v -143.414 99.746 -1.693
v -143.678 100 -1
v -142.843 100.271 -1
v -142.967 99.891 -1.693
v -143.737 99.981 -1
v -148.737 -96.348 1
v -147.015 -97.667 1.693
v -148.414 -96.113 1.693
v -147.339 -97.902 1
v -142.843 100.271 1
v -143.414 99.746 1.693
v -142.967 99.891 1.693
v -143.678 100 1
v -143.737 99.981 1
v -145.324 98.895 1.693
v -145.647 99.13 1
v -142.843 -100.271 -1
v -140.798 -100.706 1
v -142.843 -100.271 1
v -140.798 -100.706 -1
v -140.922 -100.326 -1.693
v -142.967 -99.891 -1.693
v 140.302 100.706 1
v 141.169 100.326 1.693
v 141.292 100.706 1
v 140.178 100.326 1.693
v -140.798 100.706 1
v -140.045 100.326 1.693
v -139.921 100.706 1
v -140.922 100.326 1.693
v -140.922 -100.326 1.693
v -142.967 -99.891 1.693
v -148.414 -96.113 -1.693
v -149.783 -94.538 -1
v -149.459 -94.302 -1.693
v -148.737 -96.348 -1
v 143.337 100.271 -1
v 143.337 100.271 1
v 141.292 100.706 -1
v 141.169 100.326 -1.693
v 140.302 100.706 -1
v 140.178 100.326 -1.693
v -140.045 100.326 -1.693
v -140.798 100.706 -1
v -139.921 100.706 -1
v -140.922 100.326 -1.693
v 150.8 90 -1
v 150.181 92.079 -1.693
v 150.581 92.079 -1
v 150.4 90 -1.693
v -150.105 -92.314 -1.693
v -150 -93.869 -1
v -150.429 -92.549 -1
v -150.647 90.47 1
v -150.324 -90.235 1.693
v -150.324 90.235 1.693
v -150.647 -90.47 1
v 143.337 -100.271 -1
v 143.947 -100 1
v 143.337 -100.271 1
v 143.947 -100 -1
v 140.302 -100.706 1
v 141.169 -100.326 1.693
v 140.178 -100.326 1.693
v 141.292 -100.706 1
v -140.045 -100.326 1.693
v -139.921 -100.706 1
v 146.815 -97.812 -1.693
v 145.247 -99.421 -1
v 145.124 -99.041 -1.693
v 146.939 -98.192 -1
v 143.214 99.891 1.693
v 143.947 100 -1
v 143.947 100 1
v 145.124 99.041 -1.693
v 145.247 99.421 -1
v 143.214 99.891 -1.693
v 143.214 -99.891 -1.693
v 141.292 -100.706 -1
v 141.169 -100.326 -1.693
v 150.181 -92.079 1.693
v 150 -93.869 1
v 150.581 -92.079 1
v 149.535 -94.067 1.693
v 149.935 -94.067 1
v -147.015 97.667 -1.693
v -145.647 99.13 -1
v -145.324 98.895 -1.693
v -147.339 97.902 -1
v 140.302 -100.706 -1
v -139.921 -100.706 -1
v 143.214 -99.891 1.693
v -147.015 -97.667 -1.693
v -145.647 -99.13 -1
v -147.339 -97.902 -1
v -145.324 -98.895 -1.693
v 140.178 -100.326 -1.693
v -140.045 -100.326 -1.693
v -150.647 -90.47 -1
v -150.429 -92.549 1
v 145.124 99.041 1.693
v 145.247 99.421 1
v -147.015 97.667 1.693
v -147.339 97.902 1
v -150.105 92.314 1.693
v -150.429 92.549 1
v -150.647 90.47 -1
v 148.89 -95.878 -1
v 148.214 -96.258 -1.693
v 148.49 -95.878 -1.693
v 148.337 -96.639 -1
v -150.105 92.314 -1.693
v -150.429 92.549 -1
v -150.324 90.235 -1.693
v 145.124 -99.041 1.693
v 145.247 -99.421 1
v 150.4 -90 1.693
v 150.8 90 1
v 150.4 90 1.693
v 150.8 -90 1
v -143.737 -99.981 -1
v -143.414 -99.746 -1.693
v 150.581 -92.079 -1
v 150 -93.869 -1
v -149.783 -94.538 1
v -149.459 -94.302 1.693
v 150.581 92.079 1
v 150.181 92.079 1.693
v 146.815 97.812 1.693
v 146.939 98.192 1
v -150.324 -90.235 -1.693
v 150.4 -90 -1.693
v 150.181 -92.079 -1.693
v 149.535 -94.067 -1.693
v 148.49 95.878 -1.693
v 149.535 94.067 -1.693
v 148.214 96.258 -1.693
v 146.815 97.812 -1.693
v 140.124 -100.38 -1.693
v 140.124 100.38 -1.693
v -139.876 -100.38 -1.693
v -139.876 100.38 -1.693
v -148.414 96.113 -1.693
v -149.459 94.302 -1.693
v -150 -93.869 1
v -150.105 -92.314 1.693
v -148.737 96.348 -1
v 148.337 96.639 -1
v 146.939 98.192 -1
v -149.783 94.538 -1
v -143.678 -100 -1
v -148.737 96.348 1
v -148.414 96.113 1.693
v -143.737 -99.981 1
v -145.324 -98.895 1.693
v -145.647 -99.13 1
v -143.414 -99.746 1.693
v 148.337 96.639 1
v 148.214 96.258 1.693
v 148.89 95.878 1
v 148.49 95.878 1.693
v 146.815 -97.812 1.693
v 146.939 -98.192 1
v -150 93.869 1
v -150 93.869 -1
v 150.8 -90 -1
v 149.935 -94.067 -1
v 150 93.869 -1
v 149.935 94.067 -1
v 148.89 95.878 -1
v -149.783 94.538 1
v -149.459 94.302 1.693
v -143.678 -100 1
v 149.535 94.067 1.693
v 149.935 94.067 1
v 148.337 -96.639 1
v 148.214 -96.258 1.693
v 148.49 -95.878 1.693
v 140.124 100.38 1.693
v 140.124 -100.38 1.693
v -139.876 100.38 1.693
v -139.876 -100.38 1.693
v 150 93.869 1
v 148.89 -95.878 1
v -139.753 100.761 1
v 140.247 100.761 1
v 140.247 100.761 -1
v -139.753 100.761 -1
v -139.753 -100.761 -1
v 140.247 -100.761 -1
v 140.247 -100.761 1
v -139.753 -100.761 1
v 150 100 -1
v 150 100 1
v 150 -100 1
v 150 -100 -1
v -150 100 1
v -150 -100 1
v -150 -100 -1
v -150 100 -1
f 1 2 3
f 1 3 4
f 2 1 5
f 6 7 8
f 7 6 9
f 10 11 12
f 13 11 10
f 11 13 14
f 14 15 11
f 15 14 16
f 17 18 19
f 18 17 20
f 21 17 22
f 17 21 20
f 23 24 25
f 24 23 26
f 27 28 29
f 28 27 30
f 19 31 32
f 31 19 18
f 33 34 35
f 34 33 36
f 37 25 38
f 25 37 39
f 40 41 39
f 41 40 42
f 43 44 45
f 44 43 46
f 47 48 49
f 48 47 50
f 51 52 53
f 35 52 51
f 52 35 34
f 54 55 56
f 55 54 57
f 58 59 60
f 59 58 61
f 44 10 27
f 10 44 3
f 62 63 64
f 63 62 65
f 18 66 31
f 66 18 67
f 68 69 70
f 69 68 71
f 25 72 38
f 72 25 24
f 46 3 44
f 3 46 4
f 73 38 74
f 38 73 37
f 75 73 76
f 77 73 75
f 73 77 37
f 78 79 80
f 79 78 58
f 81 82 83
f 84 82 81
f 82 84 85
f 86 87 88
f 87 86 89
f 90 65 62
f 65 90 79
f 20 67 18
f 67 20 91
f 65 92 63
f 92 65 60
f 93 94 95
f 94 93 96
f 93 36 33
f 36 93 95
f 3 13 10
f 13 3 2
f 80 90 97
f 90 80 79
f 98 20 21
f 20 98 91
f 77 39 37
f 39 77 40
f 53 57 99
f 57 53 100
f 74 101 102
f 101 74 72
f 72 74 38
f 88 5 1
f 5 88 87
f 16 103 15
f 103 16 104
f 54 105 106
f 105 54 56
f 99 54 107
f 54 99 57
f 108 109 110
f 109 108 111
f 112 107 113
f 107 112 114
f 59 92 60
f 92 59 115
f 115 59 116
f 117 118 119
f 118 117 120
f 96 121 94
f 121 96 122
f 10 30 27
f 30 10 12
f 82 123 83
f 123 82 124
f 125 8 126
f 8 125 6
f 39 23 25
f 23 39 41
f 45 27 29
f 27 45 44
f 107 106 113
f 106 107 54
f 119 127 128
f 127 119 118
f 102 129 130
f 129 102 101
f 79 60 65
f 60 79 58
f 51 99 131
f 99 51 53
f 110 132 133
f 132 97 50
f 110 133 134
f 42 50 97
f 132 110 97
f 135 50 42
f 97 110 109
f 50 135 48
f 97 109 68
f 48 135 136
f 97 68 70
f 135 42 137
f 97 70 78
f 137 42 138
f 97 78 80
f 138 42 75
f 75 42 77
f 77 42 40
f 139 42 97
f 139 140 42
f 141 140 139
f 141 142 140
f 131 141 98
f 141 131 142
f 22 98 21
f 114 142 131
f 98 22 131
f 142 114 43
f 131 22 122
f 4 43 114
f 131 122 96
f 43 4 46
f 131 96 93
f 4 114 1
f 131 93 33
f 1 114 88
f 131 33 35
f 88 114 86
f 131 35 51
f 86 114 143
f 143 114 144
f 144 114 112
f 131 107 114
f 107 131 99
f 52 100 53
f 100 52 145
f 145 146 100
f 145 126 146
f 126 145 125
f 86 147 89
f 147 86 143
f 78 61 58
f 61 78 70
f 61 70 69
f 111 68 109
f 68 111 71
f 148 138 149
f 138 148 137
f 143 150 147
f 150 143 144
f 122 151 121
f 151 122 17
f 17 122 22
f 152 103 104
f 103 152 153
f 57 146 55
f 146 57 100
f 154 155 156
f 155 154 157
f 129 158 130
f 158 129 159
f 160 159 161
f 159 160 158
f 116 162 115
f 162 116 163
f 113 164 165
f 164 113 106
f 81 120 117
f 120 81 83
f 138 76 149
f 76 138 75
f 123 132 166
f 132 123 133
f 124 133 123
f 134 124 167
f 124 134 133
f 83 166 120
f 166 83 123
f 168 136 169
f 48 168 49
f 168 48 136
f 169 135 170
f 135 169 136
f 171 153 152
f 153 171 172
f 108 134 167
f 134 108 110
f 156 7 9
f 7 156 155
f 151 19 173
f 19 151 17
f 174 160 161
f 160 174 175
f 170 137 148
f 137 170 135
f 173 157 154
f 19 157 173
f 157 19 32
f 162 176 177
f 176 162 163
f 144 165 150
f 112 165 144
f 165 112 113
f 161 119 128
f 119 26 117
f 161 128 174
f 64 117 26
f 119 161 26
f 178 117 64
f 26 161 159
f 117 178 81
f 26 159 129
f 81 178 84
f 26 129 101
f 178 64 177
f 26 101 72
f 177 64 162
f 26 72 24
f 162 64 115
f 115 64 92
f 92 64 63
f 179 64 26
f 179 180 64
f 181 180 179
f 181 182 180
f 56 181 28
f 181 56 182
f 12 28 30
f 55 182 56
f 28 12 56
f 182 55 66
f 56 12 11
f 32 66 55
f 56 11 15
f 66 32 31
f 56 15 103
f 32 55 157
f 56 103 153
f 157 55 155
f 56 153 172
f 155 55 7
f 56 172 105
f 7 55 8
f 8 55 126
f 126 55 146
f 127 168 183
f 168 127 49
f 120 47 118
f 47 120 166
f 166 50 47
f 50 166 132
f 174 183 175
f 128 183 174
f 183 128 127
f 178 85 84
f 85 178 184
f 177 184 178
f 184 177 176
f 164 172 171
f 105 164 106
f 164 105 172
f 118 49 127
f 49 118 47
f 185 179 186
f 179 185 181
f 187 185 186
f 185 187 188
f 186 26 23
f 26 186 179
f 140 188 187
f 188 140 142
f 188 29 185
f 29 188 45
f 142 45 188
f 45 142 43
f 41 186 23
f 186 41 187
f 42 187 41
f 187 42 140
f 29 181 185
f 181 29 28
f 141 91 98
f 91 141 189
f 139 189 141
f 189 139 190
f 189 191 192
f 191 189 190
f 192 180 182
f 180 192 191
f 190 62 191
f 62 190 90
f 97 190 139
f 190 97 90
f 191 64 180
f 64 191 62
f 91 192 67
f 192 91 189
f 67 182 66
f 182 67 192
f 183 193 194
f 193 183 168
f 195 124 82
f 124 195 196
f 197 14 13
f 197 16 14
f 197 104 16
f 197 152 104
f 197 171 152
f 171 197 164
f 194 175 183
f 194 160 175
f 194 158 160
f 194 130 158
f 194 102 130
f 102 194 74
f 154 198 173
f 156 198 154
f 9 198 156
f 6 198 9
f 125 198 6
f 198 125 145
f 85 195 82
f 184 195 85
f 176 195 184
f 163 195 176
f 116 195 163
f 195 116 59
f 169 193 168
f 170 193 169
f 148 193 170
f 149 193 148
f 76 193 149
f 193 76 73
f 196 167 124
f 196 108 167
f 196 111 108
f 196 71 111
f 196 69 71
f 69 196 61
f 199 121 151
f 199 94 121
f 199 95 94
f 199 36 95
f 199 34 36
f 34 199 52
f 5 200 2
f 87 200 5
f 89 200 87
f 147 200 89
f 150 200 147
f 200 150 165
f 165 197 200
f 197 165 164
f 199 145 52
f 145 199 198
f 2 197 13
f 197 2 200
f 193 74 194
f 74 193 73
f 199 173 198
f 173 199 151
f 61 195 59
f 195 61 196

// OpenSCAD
// Parameters
sheet_length = 300; //[150:600:1]
sheet_width = 200; //[100:400:1]
sheet_thickness = 2; //[1:6:0.5]
corner_radius = 10; //[2:30:1]
chamfer_size = 0.8; //[0.2:2:0.1]
overlap = 1; //[0.5:2:0.5]

// Base Shapes
module sheet_plate() {
  cube([sheet_length, sheet_width, sheet_thickness], center=true);
}

module rounded_corners() {
  linear_extrude(height=sheet_thickness, center=true) {
    polygon(points=[
      [-sheet_length/2 + corner_radius, -sheet_width/2],
      [sheet_length/2 - corner_radius, -sheet_width/2],
      [sheet_length/2, -sheet_width/2 + corner_radius],
      [sheet_length/2, sheet_width/2 - corner_radius],
      [sheet_length/2 - corner_radius, sheet_width/2],
      [-sheet_length/2 + corner_radius, sheet_width/2],
      [-sheet_length/2, sheet_width/2 - corner_radius],
      [-sheet_length/2, -sheet_width/2 + corner_radius]
    ]);
  }
}

module rounded_corners_corner_circle(pos) {
  translate(pos)
    cylinder(r=corner_radius, h=sheet_thickness, center=true);
}

module chamfer_edges_sphere() {
  sphere(r=chamfer_size);
}

module surface_texture_weave() {
  cube([sheet_length, sheet_width, sheet_thickness], center=true);
}

// Operations
module rounded_corners_union() {
  union() {
    rounded_corners();
    rounded_corners_corner_circle([sheet_length/2 - corner_radius, sheet_width/2 - corner_radius, 0]);
    rounded_corners_corner_circle([-sheet_length/2 + corner_radius, sheet_width/2 - corner_radius, 0]);
    rounded_corners_corner_circle([sheet_length/2 - corner_radius, -sheet_width/2 + corner_radius, 0]);
    rounded_corners_corner_circle([-sheet_length/2 + corner_radius, -sheet_width/2 + corner_radius, 0]);
  }
}

module sheet_with_rounded_corners() {
  intersection() {
    sheet_plate();
    rounded_corners_union();
  }
}

module chamfer_edges() {
  minkowski() {
    sheet_with_rounded_corners();
    chamfer_edges_sphere();
  }
}

module complete_model() {
  union() {
    chamfer_edges();
    surface_texture_weave();
  }
}

// Final Output
color([0.2, 0.2, 0.2]) complete_model();
